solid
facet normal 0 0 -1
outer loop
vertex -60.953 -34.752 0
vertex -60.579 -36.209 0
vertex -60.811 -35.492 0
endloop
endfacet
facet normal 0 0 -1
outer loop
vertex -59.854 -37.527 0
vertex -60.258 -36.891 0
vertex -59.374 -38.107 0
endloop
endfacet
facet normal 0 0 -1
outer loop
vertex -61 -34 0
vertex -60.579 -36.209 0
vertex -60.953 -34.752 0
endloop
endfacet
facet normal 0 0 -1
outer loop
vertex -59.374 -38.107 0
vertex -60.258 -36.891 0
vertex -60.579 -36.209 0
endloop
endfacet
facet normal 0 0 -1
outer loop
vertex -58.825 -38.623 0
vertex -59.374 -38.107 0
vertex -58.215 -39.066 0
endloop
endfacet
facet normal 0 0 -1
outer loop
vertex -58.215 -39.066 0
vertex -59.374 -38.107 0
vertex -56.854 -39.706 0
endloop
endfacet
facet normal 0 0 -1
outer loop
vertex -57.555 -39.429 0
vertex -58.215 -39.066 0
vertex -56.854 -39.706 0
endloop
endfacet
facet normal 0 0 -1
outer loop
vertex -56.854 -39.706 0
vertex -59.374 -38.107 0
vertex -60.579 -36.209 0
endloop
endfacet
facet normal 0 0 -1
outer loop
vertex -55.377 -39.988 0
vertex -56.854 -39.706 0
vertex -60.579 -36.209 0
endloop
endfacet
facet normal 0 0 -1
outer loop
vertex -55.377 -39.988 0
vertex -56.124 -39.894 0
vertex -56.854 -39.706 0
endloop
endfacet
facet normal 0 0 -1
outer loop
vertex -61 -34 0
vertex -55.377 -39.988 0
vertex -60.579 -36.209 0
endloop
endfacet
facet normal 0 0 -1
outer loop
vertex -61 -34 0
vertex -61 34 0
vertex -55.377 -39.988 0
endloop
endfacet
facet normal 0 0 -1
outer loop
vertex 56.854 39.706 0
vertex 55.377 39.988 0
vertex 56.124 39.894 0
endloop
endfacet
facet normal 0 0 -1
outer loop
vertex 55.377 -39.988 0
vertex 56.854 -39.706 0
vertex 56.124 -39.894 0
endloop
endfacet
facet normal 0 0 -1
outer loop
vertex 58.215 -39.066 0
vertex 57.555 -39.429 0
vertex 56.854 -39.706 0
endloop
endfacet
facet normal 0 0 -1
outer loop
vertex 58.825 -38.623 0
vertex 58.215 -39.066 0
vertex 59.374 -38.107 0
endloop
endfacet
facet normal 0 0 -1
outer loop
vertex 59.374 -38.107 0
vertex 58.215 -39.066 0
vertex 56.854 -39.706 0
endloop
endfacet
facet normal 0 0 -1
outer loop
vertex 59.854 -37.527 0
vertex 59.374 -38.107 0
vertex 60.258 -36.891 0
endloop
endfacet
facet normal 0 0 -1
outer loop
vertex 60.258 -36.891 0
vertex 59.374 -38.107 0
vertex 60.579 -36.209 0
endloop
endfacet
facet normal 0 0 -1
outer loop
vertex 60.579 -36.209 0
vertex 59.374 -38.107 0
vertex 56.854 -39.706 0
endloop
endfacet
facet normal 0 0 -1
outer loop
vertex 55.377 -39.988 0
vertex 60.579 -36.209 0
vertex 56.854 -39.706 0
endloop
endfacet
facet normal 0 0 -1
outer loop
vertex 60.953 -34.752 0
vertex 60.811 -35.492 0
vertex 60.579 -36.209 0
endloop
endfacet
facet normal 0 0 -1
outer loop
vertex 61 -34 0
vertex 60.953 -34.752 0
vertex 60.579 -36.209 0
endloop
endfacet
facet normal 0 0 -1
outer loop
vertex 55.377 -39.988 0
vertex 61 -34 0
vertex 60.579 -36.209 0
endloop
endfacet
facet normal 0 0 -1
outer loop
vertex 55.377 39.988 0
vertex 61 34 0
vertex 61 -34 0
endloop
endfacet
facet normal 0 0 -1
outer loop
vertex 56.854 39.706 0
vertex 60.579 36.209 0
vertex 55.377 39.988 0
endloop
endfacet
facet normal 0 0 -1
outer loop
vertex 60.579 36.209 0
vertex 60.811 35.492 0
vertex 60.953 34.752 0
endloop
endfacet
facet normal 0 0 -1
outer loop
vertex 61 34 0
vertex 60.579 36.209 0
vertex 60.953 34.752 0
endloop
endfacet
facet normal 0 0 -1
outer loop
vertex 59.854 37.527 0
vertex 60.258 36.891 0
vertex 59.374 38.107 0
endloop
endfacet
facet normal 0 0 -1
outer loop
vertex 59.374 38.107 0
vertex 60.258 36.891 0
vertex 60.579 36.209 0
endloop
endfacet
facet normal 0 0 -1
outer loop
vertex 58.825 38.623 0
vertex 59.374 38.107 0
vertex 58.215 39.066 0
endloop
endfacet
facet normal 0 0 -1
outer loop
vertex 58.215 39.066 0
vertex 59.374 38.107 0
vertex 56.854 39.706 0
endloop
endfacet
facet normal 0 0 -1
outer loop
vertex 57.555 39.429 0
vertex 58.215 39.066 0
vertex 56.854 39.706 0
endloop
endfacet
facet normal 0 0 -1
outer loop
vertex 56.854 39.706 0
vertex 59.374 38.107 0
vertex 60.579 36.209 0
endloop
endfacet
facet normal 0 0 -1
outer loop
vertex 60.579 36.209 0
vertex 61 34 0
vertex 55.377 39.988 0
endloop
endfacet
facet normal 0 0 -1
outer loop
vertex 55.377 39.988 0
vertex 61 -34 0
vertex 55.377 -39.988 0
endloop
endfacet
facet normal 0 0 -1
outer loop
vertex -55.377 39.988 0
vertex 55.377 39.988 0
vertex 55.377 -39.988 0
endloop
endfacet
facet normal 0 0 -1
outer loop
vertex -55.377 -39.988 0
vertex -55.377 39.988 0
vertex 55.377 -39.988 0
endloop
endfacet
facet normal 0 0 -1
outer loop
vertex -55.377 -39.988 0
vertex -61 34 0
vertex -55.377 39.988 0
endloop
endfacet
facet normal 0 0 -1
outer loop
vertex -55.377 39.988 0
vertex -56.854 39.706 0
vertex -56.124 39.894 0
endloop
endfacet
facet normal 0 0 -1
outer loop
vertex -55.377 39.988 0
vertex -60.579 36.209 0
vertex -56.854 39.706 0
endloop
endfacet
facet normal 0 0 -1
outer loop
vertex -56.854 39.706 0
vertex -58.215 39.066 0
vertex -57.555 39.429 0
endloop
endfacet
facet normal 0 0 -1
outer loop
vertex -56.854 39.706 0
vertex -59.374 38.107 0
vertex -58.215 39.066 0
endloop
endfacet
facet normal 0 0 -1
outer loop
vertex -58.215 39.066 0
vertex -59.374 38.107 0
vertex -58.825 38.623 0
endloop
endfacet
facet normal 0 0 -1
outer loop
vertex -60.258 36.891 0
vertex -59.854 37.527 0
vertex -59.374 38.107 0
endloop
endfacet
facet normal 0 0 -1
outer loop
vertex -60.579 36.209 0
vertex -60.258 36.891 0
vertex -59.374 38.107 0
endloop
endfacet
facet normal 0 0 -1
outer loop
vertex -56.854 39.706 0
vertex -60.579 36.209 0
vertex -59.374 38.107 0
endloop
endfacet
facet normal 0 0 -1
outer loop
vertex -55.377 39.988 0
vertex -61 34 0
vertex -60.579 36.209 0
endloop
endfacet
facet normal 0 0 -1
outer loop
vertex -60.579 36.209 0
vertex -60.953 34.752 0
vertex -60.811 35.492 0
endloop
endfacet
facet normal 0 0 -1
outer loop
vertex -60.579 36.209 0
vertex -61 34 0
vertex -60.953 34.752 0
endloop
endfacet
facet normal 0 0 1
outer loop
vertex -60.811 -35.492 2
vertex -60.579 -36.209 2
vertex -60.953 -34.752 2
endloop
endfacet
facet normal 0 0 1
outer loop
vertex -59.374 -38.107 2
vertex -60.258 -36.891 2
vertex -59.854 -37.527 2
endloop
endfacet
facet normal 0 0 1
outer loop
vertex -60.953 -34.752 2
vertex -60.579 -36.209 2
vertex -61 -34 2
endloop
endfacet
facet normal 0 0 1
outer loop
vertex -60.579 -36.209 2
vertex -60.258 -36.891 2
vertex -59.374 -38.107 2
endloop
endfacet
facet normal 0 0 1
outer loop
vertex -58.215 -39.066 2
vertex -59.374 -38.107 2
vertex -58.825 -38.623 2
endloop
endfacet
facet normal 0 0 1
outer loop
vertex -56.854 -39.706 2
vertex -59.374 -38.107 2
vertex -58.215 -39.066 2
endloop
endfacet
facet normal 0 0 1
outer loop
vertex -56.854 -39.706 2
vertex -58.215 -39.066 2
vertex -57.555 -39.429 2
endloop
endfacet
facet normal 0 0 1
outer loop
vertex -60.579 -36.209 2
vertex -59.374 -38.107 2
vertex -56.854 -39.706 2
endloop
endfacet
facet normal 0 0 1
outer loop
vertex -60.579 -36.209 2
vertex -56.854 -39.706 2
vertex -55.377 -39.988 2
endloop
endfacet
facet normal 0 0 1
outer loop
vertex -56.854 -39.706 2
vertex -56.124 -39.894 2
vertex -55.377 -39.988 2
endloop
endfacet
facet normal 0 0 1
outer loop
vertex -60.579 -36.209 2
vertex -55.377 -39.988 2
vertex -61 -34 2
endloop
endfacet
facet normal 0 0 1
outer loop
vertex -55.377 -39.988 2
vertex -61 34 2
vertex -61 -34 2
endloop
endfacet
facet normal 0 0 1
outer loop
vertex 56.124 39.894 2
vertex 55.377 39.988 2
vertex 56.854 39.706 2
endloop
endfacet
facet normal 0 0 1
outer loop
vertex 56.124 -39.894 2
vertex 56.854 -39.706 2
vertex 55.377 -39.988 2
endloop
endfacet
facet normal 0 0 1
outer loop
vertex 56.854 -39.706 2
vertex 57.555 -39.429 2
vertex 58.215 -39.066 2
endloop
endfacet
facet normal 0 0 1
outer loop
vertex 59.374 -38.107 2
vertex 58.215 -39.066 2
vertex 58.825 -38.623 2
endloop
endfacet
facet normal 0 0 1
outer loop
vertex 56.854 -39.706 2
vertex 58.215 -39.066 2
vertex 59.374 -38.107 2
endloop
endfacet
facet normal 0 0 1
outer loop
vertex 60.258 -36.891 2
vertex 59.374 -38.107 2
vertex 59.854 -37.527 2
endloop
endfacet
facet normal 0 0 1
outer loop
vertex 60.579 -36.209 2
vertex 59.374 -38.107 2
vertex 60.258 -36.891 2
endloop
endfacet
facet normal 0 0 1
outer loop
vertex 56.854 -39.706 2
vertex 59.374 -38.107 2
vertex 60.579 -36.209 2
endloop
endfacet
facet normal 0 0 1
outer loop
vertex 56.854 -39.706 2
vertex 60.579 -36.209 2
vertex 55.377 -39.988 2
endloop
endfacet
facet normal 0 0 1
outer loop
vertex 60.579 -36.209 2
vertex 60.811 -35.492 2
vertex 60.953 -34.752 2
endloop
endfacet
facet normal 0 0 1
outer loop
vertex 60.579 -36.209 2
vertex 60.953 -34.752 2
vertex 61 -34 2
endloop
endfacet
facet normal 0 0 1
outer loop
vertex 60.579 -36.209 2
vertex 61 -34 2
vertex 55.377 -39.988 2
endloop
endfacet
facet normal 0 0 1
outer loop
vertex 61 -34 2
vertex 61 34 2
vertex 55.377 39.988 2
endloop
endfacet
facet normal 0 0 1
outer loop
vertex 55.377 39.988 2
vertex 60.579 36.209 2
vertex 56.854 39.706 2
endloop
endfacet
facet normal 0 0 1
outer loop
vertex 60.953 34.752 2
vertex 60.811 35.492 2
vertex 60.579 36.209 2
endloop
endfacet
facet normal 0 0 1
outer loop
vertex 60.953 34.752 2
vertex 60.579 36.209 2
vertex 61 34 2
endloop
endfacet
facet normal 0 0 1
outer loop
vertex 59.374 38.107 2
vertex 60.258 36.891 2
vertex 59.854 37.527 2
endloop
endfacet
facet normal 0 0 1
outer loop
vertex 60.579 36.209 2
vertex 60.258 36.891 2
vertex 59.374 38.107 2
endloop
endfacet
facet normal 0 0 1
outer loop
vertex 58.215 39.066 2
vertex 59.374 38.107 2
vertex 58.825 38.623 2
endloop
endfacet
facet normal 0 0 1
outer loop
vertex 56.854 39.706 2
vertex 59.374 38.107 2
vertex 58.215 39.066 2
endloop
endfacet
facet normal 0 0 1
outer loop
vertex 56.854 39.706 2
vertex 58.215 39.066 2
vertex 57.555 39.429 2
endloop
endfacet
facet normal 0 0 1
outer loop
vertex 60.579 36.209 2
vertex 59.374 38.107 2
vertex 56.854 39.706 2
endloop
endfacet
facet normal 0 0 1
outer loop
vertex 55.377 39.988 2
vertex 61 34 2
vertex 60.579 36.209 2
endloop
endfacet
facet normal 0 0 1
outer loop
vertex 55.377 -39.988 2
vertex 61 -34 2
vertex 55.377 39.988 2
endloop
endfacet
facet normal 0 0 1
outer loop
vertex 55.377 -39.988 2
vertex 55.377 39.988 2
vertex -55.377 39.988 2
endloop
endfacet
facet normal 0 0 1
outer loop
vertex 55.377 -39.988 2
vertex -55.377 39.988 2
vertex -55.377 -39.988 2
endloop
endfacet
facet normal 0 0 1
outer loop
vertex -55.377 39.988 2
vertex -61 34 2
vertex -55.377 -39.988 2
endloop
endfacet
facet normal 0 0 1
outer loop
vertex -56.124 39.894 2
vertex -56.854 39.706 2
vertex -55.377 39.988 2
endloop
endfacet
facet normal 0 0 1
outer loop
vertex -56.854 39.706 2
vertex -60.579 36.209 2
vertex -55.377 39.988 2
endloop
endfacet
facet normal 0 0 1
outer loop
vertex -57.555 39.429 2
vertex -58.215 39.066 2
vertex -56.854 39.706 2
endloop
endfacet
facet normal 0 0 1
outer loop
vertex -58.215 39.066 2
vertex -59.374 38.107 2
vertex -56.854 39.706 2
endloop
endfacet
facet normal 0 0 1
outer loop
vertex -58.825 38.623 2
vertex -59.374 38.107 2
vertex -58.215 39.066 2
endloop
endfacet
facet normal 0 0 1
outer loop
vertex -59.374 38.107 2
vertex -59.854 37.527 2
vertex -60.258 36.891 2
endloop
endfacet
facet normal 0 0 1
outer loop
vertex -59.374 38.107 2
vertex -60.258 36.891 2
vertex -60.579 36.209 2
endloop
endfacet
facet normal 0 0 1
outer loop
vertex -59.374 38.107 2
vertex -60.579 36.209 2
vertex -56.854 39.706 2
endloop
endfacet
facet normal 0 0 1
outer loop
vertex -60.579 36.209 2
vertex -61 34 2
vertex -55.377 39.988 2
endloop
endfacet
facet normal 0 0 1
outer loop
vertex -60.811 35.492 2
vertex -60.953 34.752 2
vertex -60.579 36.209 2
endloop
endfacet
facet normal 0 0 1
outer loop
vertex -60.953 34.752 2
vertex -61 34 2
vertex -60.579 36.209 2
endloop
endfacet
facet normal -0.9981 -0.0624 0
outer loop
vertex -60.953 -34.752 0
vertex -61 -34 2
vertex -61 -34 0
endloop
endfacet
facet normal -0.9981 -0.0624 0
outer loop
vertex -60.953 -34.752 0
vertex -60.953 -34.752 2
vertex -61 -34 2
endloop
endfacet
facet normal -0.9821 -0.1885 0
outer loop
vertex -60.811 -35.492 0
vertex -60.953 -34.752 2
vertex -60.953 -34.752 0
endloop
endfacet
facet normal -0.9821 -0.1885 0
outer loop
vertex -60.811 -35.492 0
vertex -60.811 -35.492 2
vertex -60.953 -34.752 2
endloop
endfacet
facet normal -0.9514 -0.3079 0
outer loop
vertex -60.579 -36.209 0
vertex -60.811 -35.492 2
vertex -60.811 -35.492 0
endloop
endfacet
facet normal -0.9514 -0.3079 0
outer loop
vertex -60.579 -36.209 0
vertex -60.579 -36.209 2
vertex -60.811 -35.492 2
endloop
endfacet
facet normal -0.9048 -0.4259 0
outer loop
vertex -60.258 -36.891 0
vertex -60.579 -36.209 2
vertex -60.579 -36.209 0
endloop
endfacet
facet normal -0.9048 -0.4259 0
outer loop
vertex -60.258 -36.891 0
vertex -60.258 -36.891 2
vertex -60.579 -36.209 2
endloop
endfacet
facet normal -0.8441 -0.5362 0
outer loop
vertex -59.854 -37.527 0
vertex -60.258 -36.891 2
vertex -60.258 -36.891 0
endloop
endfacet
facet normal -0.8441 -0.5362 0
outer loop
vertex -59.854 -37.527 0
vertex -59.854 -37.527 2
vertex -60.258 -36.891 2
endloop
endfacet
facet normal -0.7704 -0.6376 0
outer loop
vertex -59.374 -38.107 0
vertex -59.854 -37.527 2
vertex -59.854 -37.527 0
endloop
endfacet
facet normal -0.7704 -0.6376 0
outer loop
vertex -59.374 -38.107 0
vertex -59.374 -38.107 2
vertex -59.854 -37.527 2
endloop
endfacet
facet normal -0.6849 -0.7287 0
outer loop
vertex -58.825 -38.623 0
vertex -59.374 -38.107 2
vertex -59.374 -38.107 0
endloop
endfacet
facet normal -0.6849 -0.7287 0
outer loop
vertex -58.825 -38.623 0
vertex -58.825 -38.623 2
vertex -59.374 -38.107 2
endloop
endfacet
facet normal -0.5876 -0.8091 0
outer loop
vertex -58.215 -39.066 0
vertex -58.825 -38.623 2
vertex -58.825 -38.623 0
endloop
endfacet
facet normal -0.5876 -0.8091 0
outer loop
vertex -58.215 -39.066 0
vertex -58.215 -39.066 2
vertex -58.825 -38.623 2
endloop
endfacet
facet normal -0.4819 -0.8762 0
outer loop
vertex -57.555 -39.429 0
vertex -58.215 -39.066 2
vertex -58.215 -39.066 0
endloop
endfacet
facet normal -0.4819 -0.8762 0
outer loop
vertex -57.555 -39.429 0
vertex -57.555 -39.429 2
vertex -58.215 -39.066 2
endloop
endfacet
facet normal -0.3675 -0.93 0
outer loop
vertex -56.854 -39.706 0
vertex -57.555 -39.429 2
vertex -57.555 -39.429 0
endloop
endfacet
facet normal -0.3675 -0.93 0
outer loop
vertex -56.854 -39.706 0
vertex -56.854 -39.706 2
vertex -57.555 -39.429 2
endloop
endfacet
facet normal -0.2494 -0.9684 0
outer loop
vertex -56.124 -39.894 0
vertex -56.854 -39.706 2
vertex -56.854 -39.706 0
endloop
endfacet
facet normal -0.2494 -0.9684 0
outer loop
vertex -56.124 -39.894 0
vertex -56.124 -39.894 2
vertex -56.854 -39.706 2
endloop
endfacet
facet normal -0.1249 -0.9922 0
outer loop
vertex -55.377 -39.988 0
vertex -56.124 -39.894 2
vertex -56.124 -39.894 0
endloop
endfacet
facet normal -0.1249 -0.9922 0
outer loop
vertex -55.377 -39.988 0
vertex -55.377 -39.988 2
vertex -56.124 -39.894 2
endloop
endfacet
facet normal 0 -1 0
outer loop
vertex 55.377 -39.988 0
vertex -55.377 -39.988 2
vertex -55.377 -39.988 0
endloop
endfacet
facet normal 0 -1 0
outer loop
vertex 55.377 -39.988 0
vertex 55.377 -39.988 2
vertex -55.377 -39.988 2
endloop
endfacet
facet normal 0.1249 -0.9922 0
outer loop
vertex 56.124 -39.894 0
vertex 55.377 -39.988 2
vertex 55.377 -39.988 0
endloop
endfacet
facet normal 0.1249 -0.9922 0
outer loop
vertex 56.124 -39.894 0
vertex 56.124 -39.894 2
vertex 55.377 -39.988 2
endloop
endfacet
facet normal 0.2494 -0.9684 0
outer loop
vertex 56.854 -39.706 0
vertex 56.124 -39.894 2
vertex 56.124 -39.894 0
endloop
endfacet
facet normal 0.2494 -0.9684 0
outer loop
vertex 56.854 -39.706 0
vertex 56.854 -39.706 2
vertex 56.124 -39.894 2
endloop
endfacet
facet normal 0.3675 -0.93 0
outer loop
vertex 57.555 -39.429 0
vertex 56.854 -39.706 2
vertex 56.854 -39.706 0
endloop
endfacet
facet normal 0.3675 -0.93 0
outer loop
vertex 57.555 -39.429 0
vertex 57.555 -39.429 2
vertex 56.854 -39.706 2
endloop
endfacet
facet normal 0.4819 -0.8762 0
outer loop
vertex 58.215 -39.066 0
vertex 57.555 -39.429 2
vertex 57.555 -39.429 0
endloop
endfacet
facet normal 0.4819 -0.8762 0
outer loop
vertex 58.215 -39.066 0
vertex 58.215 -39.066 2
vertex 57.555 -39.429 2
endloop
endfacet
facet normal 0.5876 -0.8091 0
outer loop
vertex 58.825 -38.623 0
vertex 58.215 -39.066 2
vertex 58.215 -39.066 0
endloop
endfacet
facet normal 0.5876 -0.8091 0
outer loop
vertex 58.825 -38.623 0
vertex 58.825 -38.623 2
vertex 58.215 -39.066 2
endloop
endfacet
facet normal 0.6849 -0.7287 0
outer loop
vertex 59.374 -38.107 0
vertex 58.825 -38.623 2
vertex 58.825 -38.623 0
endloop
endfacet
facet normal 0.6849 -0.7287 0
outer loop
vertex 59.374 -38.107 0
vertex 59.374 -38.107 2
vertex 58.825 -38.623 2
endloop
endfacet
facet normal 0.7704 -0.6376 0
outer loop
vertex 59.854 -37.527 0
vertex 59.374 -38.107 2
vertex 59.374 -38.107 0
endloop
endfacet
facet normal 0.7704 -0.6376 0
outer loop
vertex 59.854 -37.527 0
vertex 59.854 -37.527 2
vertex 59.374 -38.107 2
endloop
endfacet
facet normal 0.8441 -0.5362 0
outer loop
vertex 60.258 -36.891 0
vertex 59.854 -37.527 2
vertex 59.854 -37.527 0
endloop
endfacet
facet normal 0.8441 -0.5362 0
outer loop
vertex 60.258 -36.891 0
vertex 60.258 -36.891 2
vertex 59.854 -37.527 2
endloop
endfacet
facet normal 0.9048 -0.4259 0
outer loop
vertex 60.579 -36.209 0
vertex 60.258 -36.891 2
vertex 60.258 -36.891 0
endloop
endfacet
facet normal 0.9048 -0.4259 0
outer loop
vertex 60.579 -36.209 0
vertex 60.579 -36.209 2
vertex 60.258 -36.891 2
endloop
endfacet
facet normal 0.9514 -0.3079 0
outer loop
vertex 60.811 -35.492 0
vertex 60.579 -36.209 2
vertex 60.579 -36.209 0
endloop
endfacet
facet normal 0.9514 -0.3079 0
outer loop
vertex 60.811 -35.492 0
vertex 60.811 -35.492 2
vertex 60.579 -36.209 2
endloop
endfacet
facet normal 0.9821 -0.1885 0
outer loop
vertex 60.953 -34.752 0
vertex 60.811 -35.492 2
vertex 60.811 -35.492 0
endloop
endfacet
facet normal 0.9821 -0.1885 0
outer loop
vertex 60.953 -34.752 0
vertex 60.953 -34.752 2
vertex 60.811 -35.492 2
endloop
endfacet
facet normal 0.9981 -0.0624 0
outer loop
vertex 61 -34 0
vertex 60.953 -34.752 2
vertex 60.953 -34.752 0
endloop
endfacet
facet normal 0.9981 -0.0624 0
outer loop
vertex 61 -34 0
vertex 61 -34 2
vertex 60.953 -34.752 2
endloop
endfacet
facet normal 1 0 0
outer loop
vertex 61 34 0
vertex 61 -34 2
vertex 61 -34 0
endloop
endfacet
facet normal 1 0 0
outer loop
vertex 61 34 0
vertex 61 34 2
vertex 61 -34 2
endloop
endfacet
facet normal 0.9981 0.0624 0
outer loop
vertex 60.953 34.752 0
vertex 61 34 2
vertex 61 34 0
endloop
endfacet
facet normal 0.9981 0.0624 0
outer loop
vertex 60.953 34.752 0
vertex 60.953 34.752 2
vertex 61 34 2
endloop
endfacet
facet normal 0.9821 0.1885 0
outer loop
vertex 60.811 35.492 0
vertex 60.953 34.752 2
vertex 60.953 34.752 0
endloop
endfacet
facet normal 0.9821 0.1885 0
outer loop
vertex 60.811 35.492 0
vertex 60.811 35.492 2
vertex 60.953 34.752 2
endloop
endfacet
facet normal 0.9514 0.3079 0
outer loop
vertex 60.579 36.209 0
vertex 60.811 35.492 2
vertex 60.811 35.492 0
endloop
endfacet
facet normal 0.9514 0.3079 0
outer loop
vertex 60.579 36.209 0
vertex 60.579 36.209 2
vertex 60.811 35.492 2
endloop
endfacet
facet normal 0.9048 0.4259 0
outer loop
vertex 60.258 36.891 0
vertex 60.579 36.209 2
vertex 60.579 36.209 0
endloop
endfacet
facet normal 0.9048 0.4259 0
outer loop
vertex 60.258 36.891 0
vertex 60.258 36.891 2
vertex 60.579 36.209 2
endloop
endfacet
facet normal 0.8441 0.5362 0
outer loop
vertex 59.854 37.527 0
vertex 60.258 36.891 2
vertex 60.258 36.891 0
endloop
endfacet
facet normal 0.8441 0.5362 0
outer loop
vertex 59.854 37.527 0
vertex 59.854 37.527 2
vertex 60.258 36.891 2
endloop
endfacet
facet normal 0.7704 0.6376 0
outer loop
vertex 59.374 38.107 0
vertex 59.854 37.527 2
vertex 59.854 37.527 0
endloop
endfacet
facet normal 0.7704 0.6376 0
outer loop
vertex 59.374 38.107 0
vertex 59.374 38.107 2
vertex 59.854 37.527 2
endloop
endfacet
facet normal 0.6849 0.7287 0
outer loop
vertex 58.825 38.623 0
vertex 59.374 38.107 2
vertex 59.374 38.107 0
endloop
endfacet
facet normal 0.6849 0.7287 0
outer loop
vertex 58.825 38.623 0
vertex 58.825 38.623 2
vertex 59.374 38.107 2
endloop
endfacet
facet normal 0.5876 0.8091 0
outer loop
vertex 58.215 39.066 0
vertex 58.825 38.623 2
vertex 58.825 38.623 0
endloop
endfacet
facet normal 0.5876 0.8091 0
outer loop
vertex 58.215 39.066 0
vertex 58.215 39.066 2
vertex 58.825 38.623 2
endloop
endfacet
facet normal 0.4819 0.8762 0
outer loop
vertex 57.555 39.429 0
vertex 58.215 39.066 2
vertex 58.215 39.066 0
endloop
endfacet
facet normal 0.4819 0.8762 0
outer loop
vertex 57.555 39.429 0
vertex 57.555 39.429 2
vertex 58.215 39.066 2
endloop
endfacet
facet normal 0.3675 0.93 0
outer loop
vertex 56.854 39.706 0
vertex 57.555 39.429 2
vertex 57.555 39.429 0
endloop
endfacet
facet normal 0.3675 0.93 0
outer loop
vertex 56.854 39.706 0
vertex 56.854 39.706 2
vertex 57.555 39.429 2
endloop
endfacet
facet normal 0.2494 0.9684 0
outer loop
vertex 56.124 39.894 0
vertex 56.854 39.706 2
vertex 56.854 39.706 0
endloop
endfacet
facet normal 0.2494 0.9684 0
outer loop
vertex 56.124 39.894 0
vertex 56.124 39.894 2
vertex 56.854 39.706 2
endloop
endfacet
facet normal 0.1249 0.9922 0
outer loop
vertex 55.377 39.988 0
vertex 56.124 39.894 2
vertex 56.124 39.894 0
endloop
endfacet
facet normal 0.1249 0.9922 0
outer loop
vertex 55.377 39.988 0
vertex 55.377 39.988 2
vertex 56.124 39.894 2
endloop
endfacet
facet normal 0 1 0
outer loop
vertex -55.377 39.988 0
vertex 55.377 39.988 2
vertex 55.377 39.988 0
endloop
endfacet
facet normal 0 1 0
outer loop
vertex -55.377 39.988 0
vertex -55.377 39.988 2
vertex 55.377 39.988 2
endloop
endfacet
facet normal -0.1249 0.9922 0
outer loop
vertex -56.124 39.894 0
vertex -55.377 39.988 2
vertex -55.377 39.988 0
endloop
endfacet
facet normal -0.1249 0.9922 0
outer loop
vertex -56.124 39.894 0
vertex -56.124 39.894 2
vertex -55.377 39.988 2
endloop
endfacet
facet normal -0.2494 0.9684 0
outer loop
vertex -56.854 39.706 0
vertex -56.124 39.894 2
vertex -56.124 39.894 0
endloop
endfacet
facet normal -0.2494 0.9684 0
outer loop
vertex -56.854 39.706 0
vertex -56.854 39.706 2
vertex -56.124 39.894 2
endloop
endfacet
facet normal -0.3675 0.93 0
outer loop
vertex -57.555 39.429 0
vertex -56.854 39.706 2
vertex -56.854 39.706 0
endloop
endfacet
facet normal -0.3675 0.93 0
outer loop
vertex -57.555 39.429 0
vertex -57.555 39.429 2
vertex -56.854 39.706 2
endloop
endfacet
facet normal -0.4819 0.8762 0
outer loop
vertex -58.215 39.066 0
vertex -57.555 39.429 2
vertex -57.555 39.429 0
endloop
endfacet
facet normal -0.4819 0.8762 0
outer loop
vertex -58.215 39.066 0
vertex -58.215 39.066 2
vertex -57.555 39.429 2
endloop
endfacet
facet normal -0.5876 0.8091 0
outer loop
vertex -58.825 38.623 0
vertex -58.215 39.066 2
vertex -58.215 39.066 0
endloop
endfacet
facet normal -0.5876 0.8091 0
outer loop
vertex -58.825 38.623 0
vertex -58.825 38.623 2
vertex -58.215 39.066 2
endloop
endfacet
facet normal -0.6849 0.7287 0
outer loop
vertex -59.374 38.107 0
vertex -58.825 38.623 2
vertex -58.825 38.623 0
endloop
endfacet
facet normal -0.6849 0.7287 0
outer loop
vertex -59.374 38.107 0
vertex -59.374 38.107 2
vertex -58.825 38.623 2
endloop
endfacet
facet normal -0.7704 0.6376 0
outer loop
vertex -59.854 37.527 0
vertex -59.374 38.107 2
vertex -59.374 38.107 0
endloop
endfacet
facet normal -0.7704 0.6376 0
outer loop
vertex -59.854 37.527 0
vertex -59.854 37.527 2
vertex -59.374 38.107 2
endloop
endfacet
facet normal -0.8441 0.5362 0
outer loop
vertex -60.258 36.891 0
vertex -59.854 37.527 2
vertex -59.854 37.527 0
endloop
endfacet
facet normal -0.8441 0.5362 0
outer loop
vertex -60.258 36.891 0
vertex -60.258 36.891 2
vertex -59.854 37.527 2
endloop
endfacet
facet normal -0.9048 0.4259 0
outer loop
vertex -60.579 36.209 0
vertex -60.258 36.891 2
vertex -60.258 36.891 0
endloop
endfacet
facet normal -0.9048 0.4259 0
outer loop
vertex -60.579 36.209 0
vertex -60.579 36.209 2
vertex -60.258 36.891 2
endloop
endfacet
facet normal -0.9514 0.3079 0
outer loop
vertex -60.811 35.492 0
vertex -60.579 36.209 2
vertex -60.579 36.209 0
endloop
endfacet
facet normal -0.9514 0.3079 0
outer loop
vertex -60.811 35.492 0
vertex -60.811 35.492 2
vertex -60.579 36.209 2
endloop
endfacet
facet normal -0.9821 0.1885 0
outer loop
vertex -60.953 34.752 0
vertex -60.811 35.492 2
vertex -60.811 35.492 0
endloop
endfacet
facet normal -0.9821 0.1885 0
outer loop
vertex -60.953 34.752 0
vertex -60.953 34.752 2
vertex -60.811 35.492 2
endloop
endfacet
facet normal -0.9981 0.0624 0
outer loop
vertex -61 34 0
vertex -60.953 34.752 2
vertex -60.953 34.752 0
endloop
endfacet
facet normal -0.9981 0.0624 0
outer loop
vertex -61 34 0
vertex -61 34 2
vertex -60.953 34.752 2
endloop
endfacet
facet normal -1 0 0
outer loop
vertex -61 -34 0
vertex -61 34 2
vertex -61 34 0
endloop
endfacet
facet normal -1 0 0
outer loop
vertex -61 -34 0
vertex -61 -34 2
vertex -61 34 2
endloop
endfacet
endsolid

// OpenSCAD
$fn=50;

grid=42;
brim=2;
size=[3,2];
rad=8-brim;
thick=2;

linear_extrude(thick) hull() for (ix=[-1,1],iy=[-1,1])
  translate([ix*(size.x*grid/2-brim-rad),iy*(size.y*grid/2-brim-rad)]) circle(rad);
